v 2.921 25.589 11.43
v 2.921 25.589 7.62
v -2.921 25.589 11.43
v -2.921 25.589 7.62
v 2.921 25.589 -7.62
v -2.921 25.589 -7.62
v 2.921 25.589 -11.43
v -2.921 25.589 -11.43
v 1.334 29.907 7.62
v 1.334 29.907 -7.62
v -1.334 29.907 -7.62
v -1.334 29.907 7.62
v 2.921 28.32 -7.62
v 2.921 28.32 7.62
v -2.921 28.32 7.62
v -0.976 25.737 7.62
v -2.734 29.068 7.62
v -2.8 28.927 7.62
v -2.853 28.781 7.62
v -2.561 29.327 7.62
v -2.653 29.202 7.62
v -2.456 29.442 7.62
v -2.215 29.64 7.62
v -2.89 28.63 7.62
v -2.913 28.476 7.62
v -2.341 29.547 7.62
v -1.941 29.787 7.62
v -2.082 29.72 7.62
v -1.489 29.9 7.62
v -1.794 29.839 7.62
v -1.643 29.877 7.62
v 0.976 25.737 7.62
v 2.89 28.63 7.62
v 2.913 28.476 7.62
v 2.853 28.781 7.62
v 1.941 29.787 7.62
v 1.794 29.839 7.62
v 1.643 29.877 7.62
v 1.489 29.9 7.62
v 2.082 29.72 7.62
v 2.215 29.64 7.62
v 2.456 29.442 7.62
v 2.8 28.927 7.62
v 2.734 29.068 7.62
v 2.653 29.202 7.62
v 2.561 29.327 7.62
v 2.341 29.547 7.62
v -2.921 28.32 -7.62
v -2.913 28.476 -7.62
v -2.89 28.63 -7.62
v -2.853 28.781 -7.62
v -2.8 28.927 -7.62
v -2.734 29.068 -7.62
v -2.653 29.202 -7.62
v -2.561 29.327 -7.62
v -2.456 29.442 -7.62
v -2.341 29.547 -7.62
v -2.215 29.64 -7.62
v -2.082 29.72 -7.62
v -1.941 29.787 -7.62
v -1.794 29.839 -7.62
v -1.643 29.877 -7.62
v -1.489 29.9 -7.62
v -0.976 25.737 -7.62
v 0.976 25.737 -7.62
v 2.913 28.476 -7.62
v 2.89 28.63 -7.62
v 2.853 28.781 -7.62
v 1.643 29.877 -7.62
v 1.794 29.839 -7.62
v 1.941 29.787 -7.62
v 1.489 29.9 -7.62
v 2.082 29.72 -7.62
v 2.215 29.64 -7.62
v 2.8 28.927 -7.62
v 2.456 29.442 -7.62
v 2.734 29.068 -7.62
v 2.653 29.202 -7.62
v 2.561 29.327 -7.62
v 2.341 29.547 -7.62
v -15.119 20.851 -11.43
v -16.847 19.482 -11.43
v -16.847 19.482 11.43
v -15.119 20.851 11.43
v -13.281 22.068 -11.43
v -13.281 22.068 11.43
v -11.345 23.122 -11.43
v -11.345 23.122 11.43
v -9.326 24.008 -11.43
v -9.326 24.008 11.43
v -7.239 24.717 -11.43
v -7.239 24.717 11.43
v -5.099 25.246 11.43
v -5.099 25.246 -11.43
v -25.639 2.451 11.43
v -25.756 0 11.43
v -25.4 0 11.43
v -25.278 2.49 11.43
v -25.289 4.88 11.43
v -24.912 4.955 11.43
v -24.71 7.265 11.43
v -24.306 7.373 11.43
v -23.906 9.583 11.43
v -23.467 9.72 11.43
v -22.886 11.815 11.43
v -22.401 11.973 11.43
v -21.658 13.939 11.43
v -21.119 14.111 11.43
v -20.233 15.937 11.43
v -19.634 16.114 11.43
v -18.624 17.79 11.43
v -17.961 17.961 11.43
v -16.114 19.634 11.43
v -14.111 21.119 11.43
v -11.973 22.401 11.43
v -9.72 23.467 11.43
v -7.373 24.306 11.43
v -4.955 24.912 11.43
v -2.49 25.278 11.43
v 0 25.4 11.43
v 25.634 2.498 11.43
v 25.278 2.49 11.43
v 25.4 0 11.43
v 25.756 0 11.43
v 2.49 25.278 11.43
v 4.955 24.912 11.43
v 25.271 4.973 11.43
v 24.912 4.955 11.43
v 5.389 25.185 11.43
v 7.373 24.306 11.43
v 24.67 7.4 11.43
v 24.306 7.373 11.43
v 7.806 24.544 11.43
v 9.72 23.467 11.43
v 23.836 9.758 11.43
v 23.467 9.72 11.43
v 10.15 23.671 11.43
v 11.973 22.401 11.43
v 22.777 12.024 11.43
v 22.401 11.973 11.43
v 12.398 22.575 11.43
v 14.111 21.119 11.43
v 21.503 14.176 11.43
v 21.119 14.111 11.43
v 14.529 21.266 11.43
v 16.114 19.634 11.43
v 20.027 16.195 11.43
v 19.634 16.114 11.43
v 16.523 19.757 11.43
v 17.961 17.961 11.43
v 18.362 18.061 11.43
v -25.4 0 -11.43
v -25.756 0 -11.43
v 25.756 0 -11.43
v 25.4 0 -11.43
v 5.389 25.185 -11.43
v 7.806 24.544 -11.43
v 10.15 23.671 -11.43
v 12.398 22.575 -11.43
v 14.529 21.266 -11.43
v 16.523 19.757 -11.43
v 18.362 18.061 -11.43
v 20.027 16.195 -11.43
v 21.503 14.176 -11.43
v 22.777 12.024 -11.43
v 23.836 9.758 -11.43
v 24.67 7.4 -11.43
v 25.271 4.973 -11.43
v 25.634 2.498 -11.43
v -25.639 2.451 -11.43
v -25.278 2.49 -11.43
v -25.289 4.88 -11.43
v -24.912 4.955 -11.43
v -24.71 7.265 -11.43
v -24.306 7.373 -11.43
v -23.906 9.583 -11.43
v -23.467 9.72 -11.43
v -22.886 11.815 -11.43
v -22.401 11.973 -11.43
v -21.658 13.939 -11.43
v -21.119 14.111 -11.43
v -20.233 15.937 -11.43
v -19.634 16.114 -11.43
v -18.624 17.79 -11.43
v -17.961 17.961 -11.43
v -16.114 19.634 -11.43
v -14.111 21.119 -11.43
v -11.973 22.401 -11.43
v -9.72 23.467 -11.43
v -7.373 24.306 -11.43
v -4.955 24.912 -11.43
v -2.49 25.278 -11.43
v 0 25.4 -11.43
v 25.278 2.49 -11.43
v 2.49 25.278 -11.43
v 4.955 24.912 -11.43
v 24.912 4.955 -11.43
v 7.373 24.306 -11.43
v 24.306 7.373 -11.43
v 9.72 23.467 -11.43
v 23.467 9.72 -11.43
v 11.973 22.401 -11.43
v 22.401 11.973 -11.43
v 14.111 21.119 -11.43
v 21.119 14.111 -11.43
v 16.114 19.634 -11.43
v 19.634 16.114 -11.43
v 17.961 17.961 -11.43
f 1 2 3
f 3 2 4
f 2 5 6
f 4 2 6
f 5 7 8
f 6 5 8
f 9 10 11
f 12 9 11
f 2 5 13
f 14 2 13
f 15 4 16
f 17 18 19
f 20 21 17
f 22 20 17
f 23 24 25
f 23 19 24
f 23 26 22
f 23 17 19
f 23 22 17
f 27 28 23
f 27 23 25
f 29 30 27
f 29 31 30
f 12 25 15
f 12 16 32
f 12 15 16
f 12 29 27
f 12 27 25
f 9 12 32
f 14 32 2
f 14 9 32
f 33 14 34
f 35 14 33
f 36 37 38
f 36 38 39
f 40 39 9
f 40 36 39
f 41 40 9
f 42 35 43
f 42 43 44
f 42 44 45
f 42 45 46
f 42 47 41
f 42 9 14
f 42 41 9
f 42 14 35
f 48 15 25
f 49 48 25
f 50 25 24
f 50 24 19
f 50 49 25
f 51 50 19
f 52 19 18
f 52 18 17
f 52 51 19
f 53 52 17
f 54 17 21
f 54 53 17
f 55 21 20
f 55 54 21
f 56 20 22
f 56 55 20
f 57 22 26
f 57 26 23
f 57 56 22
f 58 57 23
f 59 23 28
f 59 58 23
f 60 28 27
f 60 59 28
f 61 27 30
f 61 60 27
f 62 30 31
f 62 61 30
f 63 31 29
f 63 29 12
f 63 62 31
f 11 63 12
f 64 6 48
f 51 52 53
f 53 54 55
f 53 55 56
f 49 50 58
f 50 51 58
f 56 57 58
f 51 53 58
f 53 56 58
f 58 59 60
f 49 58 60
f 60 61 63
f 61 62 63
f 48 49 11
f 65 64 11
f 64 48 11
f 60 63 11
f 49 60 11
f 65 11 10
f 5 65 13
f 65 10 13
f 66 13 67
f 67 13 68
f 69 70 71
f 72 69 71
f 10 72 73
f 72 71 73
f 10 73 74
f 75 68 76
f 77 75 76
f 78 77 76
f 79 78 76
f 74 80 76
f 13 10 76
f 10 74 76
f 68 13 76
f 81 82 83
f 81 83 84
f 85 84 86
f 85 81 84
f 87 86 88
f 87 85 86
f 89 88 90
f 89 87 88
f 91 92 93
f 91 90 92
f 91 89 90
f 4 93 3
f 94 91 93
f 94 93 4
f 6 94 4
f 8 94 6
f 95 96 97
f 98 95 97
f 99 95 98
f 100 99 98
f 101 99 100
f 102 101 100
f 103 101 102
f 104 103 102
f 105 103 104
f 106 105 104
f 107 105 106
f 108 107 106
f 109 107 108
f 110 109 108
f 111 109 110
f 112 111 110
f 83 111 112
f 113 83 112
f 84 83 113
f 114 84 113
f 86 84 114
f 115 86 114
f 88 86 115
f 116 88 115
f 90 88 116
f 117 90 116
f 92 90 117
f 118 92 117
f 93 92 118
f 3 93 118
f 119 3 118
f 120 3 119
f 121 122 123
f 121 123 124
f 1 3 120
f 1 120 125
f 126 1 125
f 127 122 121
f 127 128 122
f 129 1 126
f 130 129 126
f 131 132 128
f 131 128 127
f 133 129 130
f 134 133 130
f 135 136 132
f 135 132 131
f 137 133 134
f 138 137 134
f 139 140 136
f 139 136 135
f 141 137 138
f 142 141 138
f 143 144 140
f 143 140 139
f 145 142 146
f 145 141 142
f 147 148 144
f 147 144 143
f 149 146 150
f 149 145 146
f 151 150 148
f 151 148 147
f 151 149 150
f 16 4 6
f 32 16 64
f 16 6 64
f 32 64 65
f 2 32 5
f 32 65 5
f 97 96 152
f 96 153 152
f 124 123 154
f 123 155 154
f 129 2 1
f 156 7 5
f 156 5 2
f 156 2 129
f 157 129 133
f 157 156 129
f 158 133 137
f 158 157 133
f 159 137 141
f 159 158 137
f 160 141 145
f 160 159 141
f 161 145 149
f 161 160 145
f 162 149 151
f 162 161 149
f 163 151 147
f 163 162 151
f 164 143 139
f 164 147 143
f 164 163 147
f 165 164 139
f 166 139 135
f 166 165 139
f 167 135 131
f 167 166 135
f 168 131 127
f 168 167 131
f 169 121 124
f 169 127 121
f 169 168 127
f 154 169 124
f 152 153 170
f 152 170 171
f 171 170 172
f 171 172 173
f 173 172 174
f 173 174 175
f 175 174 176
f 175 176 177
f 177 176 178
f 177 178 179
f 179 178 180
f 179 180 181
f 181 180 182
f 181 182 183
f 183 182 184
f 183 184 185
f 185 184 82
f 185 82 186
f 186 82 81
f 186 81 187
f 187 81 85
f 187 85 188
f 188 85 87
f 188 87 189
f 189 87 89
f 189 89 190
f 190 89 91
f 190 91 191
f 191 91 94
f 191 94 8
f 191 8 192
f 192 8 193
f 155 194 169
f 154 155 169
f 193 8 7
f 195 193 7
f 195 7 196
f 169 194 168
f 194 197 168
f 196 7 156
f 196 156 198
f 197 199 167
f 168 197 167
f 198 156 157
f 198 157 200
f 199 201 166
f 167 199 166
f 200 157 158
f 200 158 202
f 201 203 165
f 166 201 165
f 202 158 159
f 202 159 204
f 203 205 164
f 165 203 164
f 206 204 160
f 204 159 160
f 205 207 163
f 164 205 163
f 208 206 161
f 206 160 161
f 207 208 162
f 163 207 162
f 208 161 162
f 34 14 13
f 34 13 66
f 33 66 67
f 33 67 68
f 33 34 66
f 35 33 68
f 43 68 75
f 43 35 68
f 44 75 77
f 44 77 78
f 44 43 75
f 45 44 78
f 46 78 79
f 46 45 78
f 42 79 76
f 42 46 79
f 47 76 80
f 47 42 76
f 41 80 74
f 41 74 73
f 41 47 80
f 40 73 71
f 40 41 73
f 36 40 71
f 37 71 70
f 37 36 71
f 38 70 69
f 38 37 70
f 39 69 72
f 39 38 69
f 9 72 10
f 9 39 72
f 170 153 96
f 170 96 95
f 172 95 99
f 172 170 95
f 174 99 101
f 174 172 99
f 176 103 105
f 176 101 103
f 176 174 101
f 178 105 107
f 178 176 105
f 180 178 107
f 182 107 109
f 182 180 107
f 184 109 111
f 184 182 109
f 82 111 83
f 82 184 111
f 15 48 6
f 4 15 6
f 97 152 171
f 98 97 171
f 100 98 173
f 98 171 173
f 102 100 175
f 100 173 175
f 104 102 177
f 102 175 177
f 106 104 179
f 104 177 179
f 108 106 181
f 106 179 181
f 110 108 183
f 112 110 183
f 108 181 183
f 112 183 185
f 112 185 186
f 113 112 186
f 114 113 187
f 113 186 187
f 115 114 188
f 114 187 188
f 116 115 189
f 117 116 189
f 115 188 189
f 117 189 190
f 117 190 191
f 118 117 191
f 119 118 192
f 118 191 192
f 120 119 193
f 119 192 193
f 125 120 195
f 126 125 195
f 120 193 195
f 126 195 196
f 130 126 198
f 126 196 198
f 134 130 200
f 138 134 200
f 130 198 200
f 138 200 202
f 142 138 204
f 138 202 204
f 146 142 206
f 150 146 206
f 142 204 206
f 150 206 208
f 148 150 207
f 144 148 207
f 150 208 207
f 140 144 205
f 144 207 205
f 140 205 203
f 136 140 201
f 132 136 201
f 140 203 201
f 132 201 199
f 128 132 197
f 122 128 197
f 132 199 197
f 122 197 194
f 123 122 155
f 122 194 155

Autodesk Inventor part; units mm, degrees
ref_plane "YZ Plane" through (0, 0, 0) normal (1, 0, 0) x (0, 1, 0)
ref_plane "XZ Plane" through (0, 0, 0) normal (0, 1, 0) x (-1, 0, 0)
ref_plane "XY Plane" through (0, 0, 0) normal (0, 0, 1) x (1, 0, 0)
sketch "Sketch1" plane through (0, 0, 0) normal (0, 0, 1) x (1, 0, 0)
  arc A0 (25.7556, 0) -> (-16.846658, 19.481813) centre (0, 0) ccw
  arc A1 (-16.846658, 19.481813) -> (-25.7556, 0) centre (0, 0) ccw
  arc A2 (25.4, 0) -> (-25.4, 0) centre (0, 0) ccw
  line L0 (-25.4, 0) -> (-25.7556, 0)
  line L1 (25.4, 0) -> (25.7556, 0)
  line L2 (-2.921, 25.589425) -> (2.921, 25.589425)
  line L3 (2.921, 25.589425) -> (2.921, 29.907425)
  line L4 (2.921, 29.907425) -> (-2.921, 29.907425)
  line L5 (-2.921, 29.907425) -> (-2.921, 25.589425)
  point P0 (25.5778, 0)
  point P1 (-25.5778, 0)
  dimension "d16" = 25.4
  dimension "d18" = 5.842
  dimension "d19" = 2.921
  dimension "d20" = 4.318
  dimension "d23" = 0.3556
  dimension "d24" = 25.7556
sketch "Sketch1 outline for Extrusion1" plane through (0, 0, 0) normal (0, 0, 1) x (1, 0, 0)
  line L0 (25.4, 0) -> (25.7556, 0)
  arc A0 (-25.4, 0) -> (25.4, 0) centre (0, 0) cw
  line L1 (-25.7556, 0) -> (-25.4, 0)
  arc A1 (-16.846658, 19.481813) -> (-25.7556, 0) centre (0, 0) ccw
  arc A2 (-2.921, 25.589425) -> (-16.846658, 19.481813) centre (0, 0) ccw
  line L2 (2.921, 25.589425) -> (-2.921, 25.589425)
  arc A3 (25.7556, 0) -> (2.921, 25.589425) centre (0, 0) ccw
extrude "Extrusion1" add sketch "Sketch1 outline for Extrusion1" along normal mid plane 22.86
extrude "Extrusion2" add sketch "Sketch1" along normal mid plane 15.24 contours A0 L5 L4 L3
fillet "Fillet1" radius 1.5875 2 edges at (2.921, 29.9074, 0) (-2.921, 29.9074, 0)
equation "\"d19\" = 0.5 * d18"
equation "\"d24\" = d16 + d23"
properties part number "Drill Motor Shifter Cover"
